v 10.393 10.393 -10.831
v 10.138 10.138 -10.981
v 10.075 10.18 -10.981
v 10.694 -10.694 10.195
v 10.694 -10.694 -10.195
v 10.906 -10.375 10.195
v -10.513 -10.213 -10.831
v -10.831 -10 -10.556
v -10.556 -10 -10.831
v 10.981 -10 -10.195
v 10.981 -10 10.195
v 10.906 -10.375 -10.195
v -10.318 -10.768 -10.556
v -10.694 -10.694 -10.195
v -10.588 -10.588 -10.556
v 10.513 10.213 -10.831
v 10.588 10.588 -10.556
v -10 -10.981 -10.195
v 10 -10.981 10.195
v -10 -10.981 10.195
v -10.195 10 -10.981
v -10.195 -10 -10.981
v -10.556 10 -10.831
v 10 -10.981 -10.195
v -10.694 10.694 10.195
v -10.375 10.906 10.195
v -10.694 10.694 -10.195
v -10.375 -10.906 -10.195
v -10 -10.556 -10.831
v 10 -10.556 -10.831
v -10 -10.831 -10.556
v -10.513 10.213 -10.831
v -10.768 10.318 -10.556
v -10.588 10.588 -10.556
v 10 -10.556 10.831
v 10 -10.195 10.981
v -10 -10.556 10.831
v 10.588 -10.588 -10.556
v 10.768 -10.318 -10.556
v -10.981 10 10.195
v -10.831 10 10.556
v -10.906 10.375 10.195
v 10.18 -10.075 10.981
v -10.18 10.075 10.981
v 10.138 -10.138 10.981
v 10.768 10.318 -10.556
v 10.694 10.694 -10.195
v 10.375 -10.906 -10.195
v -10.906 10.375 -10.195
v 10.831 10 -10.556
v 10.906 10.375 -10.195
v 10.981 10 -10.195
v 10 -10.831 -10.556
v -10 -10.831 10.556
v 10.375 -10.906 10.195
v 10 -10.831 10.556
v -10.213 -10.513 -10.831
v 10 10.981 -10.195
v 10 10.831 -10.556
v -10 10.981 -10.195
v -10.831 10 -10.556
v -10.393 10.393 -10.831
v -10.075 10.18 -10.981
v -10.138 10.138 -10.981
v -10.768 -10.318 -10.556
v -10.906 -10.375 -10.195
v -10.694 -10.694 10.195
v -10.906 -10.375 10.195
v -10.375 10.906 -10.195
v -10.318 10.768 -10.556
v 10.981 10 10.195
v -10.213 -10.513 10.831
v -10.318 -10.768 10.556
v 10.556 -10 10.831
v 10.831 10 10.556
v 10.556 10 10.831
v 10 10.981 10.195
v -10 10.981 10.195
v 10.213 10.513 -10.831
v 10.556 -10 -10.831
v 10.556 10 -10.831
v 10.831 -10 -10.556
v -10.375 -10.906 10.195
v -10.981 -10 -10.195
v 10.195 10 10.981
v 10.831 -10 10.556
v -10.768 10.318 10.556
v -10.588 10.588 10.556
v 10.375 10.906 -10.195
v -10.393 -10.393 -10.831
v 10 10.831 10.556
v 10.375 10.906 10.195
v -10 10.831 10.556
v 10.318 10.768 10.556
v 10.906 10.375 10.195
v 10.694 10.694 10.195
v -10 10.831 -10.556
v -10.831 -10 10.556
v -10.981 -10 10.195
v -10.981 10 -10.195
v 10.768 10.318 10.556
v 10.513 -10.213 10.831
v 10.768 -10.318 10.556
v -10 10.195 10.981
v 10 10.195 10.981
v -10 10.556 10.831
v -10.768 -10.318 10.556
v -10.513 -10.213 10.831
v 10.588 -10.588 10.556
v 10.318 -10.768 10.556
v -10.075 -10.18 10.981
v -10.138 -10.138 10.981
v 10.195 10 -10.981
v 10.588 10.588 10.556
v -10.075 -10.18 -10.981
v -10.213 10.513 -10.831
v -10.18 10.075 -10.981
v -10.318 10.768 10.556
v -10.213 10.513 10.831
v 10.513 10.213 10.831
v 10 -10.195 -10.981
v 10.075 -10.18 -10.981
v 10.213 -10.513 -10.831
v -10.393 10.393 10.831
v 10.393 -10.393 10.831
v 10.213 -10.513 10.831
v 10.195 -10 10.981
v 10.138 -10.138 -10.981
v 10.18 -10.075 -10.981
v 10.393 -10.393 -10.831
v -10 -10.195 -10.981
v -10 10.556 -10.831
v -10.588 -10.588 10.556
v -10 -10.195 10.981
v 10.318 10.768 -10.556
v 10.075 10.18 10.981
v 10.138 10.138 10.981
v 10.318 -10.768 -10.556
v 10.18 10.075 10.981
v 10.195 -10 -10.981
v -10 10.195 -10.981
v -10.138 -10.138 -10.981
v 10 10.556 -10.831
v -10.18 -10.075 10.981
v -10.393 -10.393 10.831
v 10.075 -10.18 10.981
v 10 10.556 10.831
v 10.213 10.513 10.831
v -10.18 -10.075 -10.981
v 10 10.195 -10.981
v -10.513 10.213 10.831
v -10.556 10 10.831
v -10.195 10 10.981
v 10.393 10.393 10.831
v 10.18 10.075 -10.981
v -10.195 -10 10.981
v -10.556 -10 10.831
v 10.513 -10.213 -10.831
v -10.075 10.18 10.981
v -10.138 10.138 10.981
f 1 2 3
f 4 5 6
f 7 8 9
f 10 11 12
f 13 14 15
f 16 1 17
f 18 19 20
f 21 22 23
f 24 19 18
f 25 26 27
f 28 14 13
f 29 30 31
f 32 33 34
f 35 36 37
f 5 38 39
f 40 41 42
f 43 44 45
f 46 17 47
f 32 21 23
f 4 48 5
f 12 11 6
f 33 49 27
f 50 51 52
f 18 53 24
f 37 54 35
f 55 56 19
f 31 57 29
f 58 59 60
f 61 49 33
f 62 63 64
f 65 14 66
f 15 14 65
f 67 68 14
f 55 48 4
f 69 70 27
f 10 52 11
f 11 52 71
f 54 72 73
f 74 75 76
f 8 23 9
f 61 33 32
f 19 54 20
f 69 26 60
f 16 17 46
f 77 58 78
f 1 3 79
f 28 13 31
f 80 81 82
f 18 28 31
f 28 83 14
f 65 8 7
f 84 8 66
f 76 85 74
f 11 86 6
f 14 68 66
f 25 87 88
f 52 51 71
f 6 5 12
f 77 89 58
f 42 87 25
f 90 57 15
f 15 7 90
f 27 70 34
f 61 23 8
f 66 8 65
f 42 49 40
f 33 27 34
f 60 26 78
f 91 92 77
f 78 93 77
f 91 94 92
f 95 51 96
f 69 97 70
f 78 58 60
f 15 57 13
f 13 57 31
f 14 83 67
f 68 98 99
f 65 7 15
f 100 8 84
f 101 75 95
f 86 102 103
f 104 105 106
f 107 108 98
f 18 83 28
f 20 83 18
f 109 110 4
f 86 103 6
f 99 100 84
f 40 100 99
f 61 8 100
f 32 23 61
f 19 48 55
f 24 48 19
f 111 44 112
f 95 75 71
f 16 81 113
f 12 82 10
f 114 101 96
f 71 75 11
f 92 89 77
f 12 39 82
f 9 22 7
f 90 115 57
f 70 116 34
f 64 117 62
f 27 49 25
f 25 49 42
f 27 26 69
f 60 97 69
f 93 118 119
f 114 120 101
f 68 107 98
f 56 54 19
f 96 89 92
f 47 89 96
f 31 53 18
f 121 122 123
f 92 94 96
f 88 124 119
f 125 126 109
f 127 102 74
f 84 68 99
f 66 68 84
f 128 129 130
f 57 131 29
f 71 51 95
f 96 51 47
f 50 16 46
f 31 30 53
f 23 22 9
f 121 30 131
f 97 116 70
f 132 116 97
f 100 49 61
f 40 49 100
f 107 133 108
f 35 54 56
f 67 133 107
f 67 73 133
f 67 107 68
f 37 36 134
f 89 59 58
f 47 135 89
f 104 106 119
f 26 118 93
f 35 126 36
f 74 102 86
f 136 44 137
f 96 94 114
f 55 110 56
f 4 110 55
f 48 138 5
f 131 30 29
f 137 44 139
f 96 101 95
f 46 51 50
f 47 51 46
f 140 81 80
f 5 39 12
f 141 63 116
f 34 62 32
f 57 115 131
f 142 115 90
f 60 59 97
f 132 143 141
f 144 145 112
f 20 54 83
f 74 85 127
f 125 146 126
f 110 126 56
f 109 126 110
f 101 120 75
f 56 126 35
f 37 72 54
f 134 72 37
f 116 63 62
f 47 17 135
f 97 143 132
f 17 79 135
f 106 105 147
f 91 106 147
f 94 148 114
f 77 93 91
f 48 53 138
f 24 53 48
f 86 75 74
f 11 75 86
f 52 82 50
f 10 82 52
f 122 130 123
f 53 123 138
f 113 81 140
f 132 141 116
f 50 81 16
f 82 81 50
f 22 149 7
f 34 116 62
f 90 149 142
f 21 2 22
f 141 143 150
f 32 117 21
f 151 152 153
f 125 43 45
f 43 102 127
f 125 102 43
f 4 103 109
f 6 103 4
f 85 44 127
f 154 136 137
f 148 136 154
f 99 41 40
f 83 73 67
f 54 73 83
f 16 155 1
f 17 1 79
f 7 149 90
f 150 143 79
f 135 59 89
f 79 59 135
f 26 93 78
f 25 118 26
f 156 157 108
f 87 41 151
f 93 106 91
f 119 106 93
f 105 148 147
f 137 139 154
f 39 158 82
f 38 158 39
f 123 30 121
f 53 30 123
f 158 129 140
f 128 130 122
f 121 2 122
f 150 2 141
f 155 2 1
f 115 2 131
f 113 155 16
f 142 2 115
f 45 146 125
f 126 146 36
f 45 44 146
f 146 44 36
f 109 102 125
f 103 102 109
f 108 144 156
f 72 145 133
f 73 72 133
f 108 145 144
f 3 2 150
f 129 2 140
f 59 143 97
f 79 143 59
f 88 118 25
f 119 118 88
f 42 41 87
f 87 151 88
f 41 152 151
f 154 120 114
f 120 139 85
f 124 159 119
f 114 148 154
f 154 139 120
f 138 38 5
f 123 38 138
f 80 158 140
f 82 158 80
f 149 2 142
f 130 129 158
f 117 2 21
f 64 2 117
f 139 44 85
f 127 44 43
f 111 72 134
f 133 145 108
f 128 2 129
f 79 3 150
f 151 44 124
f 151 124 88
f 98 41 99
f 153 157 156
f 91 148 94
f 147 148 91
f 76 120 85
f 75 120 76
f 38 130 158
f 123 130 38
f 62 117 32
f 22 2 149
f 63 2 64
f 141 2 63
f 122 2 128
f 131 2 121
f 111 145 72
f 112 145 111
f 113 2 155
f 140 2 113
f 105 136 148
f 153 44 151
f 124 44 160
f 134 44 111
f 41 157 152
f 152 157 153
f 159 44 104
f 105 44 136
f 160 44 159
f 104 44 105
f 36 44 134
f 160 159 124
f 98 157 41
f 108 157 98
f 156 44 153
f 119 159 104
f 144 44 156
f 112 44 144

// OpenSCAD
a = 1; b = 2;
minkowski() {
    cube([20, 20, 20], center = true);
    sphere(r = max(a, b) / 2, $fn = 16);
}
